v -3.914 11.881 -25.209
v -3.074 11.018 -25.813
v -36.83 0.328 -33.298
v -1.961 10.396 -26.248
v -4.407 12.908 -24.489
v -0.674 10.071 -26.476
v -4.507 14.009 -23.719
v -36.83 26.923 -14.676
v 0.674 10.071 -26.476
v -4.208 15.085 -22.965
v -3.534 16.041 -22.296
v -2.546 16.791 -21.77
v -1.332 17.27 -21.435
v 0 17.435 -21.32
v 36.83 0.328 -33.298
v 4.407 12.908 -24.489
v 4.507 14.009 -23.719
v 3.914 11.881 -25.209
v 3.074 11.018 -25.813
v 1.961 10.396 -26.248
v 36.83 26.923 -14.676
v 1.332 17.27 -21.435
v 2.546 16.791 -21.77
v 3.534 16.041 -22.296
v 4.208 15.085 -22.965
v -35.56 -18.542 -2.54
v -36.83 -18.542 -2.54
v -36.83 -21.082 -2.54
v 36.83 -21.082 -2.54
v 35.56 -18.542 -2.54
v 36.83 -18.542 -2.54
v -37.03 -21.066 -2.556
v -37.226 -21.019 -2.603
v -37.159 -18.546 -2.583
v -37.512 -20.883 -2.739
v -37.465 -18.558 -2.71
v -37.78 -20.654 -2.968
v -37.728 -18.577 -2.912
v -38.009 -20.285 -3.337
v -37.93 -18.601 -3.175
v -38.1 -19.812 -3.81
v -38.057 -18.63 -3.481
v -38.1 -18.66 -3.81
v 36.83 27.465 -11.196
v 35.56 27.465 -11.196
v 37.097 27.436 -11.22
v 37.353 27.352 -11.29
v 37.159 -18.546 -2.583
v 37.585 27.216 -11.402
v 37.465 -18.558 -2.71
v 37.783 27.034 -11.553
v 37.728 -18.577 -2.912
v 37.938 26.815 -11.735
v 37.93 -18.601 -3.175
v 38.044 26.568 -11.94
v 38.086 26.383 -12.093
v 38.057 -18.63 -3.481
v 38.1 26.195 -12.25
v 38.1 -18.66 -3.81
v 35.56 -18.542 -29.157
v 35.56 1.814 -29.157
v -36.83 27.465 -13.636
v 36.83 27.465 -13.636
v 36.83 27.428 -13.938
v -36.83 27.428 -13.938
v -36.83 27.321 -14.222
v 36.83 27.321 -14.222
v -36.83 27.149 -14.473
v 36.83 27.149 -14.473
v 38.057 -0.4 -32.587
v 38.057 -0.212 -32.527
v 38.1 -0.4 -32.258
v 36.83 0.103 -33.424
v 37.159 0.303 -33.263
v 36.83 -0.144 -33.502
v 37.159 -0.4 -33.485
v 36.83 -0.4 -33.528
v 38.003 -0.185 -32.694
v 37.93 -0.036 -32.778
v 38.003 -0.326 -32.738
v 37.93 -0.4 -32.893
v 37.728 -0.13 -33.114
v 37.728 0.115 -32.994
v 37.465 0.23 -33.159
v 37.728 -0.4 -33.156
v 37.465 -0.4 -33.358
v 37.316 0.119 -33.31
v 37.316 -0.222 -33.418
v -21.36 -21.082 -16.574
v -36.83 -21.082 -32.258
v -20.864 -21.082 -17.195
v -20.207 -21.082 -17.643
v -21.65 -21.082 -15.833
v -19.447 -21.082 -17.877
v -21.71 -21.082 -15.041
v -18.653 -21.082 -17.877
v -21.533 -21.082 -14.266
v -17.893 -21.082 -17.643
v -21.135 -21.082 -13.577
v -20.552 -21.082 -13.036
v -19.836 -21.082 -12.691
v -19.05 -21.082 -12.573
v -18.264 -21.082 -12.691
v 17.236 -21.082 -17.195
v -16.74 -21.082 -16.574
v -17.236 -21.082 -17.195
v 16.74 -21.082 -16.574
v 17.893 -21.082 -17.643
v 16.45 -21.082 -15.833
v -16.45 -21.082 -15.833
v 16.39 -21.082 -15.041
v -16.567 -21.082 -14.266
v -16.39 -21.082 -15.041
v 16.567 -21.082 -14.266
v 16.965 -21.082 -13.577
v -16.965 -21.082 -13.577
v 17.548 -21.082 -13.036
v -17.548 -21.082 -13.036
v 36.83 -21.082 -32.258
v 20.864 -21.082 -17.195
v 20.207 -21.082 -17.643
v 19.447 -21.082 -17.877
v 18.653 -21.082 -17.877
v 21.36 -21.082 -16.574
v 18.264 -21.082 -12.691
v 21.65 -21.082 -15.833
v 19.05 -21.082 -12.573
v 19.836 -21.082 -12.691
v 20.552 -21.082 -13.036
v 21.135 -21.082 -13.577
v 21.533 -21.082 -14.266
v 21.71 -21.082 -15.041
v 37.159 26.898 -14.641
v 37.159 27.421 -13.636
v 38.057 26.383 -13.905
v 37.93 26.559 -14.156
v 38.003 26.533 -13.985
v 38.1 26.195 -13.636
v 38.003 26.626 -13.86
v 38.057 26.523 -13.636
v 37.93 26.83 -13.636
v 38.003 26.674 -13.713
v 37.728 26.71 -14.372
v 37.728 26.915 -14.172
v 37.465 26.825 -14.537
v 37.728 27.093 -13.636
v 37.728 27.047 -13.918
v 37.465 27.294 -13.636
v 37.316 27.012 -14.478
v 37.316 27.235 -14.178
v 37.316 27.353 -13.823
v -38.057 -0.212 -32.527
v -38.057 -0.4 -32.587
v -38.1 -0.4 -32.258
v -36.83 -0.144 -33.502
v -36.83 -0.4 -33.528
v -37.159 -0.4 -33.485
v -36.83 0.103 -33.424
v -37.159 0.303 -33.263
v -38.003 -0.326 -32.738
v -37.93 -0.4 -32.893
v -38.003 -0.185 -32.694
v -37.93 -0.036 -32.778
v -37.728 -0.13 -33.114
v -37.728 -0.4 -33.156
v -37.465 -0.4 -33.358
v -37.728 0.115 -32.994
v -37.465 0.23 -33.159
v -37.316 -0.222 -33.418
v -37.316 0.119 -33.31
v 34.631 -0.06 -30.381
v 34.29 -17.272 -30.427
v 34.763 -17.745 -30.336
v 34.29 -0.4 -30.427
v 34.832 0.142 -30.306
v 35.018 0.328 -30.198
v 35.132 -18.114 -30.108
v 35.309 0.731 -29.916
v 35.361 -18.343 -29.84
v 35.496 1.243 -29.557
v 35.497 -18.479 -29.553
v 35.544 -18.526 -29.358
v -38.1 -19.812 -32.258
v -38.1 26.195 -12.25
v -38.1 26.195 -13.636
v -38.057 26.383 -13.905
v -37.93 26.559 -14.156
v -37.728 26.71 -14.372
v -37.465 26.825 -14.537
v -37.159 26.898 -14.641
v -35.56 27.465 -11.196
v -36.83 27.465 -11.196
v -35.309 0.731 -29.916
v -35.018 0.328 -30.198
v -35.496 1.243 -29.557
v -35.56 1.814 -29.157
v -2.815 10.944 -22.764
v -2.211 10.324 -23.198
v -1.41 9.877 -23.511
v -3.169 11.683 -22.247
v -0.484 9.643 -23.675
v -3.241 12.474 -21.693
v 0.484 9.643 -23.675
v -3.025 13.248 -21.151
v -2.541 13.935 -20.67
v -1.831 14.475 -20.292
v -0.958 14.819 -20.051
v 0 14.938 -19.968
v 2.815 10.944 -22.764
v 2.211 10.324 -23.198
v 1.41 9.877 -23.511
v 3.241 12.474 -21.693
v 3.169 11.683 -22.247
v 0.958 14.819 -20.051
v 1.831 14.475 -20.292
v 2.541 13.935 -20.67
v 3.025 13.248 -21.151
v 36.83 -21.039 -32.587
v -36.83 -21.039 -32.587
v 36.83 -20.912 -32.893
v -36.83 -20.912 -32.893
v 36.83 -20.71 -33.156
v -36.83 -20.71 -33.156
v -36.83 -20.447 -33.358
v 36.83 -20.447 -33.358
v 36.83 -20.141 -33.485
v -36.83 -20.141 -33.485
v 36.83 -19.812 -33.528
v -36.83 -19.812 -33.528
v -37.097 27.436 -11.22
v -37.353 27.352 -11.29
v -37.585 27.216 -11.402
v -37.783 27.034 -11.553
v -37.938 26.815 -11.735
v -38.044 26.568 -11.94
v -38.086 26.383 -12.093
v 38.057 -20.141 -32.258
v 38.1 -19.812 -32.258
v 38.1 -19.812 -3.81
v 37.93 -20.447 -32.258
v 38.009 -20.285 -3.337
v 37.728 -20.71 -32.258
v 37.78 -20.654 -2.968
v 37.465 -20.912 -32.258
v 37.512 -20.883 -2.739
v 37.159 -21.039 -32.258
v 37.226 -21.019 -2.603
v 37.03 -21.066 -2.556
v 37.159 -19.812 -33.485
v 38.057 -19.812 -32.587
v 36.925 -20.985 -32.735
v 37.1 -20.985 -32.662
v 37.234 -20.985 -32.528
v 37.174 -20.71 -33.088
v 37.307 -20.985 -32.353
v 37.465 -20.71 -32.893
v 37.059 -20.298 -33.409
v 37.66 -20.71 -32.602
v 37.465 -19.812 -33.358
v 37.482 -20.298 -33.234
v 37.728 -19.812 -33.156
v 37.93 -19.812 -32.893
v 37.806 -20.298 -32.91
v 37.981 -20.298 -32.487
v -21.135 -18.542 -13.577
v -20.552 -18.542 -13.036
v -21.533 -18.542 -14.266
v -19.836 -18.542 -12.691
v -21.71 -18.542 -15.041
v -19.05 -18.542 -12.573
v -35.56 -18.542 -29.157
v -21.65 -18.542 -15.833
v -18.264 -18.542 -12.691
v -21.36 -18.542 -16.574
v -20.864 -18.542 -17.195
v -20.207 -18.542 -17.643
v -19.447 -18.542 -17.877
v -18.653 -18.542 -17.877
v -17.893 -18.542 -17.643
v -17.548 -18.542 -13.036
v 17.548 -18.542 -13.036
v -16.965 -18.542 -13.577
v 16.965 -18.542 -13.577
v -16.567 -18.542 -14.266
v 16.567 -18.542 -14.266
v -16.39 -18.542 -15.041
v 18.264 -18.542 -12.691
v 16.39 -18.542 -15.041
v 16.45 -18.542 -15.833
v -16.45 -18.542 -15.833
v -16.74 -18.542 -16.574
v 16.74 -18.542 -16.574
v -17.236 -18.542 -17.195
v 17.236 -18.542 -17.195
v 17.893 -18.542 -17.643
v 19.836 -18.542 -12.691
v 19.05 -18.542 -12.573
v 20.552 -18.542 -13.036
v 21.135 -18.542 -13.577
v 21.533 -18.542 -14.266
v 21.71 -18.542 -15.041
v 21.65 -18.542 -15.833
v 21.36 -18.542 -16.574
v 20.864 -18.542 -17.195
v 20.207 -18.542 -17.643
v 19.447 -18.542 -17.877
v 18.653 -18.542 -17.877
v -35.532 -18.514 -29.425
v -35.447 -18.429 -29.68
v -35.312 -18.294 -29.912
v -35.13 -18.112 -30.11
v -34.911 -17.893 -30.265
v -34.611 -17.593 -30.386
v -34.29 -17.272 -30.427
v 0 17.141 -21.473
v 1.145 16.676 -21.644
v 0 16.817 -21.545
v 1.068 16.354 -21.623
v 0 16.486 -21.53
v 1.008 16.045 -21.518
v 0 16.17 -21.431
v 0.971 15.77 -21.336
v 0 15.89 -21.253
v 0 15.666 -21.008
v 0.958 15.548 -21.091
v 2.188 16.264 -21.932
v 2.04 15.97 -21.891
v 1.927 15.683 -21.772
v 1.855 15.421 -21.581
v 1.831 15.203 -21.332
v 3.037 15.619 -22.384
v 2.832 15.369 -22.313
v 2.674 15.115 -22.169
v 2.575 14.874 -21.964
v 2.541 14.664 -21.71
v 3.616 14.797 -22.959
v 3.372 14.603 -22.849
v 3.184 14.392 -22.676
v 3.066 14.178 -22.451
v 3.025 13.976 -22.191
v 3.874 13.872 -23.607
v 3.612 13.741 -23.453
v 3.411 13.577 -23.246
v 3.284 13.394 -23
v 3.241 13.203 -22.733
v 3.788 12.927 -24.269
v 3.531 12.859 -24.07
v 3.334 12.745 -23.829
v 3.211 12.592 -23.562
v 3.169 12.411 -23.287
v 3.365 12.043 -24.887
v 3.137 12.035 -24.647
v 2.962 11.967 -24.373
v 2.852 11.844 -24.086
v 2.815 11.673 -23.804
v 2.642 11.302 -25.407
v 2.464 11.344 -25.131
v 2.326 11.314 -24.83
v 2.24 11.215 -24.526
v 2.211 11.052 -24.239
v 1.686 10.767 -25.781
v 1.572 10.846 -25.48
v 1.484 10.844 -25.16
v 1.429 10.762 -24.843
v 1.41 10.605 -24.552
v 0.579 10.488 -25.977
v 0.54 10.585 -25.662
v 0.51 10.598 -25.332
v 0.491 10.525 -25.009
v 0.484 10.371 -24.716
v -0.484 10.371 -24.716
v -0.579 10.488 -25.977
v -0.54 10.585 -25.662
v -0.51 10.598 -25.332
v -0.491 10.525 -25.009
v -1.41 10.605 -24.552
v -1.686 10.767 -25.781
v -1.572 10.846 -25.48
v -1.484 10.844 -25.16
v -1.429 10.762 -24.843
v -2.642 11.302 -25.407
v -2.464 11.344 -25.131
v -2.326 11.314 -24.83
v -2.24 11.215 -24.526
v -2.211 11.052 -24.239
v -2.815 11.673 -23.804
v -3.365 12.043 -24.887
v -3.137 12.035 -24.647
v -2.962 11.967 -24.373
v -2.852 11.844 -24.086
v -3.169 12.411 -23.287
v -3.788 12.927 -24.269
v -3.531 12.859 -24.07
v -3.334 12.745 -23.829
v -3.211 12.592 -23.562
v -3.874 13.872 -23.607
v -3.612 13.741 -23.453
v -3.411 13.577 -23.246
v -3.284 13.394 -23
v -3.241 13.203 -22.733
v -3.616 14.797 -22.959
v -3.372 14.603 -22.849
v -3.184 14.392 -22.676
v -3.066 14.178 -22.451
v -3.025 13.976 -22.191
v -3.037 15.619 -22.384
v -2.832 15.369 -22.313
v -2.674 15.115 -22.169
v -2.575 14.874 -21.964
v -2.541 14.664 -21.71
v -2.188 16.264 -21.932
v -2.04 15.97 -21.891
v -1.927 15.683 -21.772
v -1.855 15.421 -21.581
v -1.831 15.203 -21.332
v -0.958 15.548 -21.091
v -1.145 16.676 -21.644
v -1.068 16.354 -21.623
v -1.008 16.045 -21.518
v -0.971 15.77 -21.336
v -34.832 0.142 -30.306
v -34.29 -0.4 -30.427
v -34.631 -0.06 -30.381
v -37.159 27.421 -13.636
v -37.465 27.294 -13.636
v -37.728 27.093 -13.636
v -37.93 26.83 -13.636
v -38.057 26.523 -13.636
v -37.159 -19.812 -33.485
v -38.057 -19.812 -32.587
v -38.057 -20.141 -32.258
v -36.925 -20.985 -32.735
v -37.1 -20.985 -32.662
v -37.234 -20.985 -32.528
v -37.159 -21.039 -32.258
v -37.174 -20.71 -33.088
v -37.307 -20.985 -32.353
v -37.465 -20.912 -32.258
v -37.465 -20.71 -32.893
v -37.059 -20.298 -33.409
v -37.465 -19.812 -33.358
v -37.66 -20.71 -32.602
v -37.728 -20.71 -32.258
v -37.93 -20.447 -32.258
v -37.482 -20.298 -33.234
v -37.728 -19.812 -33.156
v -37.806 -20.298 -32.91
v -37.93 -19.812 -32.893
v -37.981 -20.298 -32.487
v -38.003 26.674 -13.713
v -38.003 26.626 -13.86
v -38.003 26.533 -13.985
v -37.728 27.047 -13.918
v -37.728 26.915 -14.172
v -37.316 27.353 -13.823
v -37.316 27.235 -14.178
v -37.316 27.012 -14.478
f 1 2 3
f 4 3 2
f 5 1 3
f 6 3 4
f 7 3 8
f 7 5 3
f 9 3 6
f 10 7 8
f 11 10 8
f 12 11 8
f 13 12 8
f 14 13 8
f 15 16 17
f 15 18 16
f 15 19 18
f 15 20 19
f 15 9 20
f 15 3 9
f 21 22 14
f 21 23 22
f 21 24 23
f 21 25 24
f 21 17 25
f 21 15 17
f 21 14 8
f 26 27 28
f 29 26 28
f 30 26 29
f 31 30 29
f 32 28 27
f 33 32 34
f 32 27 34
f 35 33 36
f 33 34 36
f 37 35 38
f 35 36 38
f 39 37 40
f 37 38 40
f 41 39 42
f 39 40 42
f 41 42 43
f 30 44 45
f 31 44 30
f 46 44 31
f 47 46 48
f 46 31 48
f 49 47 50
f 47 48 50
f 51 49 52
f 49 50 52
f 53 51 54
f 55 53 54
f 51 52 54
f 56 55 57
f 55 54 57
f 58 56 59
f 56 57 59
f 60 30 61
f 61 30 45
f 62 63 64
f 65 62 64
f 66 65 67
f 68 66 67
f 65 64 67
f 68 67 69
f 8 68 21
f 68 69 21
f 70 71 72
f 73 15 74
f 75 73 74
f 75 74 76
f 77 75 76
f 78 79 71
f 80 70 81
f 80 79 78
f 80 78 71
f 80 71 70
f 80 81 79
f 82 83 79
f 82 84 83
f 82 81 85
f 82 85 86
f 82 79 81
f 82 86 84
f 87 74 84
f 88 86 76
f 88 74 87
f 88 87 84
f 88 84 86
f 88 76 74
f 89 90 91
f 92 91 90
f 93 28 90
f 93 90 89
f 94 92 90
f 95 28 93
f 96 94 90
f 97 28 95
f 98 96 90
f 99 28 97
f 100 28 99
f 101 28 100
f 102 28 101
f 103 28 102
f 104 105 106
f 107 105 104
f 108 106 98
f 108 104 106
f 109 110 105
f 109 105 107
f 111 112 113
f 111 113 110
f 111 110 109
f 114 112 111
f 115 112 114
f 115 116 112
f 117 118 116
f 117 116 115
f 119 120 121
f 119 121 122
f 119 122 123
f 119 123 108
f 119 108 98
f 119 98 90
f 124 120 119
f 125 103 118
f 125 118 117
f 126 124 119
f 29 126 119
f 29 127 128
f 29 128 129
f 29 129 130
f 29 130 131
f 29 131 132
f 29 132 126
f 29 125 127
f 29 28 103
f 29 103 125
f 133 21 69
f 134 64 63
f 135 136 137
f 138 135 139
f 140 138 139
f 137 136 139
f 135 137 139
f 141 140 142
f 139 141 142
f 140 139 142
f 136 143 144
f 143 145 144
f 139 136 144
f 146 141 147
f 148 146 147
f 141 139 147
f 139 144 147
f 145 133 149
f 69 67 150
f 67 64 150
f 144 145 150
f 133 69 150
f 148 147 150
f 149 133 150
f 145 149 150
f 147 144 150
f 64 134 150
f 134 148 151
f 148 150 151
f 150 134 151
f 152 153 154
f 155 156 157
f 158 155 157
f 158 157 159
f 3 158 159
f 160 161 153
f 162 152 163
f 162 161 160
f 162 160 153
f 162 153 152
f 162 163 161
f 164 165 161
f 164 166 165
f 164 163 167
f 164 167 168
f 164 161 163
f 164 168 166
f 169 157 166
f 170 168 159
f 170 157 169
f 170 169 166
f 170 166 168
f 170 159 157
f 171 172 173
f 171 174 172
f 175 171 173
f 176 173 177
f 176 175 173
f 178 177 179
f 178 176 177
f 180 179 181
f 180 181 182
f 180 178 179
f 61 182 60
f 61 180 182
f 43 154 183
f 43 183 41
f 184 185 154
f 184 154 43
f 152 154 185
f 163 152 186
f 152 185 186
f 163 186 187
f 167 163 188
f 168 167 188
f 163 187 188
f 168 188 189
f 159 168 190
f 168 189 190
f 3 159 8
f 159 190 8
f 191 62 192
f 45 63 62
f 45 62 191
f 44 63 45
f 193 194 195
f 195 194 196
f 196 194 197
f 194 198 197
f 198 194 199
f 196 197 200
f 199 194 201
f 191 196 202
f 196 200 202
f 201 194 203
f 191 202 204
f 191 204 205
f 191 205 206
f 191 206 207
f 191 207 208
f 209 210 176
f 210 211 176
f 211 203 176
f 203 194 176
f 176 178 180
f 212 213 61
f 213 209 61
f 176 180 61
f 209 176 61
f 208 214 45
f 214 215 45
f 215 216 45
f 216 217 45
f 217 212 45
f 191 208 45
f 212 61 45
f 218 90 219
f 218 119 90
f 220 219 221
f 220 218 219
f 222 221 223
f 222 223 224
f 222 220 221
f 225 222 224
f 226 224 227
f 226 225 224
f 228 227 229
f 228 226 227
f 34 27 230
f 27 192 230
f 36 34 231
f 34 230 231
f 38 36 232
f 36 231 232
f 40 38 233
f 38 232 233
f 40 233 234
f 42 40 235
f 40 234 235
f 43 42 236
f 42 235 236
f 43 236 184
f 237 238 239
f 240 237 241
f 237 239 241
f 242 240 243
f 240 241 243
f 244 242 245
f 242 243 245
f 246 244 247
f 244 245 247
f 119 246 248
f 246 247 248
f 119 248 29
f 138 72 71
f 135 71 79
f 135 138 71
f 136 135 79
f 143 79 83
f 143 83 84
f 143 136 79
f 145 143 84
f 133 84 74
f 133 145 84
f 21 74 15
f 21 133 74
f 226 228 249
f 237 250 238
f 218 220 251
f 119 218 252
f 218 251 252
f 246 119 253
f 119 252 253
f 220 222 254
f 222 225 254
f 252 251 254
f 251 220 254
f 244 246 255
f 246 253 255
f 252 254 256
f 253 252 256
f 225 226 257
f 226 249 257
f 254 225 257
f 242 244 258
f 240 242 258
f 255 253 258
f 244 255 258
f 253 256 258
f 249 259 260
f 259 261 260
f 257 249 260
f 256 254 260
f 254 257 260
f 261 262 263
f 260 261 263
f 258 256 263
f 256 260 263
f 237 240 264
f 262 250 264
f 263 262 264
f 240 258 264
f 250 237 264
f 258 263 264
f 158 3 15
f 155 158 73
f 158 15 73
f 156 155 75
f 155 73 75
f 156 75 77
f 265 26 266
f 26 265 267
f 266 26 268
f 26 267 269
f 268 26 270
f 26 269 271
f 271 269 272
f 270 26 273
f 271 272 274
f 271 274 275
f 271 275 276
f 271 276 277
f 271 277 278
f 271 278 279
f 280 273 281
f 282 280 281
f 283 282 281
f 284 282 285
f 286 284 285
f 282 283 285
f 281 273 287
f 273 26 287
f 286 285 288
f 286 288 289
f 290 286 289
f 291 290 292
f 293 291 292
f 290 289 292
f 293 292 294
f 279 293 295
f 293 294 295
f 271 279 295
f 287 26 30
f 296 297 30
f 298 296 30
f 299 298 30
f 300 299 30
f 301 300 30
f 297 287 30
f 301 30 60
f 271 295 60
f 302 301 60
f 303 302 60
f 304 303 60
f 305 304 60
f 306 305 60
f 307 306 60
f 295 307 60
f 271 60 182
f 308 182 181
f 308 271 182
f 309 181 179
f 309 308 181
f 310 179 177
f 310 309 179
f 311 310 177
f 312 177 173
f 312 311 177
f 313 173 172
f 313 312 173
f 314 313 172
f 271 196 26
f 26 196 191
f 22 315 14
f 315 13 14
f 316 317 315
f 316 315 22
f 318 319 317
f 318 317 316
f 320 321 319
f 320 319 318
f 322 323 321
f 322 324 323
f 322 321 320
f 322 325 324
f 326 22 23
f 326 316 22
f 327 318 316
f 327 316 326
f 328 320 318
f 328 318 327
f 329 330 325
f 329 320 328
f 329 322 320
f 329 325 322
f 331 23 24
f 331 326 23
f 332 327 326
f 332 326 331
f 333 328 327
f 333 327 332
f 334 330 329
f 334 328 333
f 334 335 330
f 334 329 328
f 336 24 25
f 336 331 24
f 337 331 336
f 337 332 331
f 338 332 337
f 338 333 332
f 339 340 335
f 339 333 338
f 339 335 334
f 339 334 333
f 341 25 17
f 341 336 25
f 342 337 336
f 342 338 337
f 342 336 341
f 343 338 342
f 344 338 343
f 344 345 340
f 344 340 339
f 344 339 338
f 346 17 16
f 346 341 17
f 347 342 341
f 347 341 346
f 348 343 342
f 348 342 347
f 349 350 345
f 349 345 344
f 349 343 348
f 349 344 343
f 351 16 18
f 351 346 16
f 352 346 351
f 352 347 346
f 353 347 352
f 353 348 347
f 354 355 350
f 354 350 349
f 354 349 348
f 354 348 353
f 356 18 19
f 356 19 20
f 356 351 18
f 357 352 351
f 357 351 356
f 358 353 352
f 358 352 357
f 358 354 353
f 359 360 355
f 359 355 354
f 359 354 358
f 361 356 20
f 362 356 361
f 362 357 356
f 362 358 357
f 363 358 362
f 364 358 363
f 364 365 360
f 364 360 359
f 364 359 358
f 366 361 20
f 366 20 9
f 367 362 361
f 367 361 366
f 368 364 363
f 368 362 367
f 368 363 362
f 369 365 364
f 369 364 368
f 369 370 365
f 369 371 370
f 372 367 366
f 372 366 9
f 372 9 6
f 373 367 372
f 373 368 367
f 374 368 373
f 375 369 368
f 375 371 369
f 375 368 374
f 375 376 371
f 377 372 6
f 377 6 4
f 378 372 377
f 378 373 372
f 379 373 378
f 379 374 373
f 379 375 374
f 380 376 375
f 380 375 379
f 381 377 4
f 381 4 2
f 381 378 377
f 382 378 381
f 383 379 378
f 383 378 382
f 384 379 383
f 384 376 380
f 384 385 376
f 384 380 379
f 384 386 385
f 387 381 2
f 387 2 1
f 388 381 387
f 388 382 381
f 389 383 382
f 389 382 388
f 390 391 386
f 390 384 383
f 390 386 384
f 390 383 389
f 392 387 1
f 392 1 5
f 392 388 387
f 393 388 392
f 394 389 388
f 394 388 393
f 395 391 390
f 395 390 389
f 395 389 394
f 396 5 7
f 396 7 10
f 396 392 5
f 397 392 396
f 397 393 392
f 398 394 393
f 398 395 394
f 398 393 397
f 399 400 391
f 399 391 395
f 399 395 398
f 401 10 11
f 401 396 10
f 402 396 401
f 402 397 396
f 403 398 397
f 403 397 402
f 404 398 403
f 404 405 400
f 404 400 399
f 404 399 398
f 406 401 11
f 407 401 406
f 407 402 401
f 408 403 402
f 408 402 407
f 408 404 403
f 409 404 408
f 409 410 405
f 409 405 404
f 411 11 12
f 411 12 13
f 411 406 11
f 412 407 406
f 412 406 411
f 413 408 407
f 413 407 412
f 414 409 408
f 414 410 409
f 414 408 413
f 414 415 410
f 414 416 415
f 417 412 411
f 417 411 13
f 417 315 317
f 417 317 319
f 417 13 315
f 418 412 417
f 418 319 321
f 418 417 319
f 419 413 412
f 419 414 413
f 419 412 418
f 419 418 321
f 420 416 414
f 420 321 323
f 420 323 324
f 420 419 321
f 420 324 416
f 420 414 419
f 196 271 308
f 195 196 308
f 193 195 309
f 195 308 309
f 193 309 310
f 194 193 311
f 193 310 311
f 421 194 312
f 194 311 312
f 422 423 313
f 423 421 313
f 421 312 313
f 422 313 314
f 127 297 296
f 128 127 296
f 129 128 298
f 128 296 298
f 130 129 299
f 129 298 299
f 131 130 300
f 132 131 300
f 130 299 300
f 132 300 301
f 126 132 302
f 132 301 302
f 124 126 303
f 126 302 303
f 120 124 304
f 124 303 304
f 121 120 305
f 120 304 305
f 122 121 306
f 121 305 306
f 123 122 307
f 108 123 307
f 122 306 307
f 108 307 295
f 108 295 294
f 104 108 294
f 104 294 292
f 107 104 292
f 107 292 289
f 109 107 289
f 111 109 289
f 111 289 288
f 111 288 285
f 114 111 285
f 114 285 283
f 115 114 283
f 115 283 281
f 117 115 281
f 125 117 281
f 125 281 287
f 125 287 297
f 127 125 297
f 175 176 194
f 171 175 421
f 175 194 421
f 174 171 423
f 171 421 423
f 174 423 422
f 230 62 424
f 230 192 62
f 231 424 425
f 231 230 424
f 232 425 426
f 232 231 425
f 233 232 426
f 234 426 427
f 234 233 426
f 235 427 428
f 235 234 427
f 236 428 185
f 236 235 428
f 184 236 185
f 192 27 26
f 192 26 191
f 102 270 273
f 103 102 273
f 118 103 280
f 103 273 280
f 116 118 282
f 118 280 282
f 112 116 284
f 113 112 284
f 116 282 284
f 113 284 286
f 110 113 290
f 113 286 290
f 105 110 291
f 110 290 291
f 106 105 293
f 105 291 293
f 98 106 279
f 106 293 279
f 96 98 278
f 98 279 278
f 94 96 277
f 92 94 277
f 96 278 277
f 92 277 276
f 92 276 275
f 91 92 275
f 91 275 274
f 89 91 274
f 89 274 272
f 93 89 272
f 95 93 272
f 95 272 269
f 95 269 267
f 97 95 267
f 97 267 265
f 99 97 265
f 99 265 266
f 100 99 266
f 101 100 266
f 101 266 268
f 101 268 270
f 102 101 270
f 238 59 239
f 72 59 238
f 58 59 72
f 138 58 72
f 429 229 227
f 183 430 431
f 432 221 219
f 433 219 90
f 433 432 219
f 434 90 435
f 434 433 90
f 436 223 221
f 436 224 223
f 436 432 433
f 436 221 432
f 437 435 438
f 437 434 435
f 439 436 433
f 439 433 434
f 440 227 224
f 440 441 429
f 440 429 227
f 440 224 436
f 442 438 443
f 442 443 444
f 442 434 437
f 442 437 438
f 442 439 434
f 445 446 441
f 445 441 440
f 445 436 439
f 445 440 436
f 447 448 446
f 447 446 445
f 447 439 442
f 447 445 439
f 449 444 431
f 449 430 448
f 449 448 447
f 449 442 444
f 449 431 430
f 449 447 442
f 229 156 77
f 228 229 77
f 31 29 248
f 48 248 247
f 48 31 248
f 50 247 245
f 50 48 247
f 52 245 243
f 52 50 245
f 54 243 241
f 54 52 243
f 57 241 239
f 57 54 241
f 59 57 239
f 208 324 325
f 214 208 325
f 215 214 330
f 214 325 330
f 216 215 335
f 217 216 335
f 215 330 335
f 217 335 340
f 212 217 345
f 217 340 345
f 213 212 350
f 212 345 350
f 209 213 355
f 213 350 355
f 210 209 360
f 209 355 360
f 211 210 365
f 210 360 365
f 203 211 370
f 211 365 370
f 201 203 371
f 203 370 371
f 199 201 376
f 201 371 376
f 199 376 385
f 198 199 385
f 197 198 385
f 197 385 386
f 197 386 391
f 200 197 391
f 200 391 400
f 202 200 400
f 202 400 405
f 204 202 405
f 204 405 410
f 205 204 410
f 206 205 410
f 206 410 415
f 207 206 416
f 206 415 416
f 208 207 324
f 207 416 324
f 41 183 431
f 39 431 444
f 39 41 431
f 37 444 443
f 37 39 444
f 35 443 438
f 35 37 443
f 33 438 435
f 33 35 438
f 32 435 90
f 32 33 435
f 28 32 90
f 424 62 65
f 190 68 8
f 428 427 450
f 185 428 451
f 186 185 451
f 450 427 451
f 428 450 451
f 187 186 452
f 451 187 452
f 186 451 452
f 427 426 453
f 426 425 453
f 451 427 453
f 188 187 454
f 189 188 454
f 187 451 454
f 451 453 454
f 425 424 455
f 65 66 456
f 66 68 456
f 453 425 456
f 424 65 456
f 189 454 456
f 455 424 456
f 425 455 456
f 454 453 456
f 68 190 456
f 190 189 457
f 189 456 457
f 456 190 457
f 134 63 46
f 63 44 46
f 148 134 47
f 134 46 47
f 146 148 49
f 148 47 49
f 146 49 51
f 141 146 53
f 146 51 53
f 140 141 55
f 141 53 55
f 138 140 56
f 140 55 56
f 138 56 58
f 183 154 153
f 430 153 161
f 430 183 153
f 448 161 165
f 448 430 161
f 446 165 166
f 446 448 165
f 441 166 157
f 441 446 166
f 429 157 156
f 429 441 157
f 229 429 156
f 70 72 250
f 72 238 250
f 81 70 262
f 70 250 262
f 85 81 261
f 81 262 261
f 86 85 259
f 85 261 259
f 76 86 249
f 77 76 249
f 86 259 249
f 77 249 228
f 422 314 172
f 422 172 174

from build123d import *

# Parameters (mm, degrees)
BOSS_EXTRUDE1_DEPTH  = 38.1
SKETCH5_W            = 76.2
SKETCH5_H            = 33.528
BOSS_EXTRUDE2_DEPTH  = 21.082
CUT_EXTRUDE2_DEPTH   = 88.66337421
SKETCH7_R            = 2.667
CUT_EXTRUDE3_DEPTH   = 69.500639142
SKETCH12_R           = 3.25
CUT_EXTRUDE7_DEPTH   = 2.54
SKETCH13_W           = 79.969594391
SKETCH13_H           = 52.20621733
CUT_EXTRUDE8_DEPTH   = 2.54
BOSS_EXTRUDE4_DEPTH  = 2.54
BOSS_EXTRUDE10_DEPTH = 2.54
FILLET8_R            = 1.27


with BuildPart() as part:
    # Sketch1 → Boss-Extrude1 (new, symmetric)
    with BuildSketch(Plane(origin=(0, 0, 0), x_dir=(0, 0, -1), z_dir=(1, 0, 0))):
        Polygon((0, 0), (33.528, 0), (14.297129242, 27.464529741), (0, 27.464529741), align=None)
    extrude(amount=BOSS_EXTRUDE1_DEPTH, both=True)

    # Sketch5 → Boss-Extrude2 (add)
    with BuildSketch(Plane.XZ):
        with Locations((0, -16.764)):
            Rectangle(SKETCH5_W, SKETCH5_H)
    extrude(amount=BOSS_EXTRUDE2_DEPTH)

    # Sketch6 → Cut-Extrude2 (cut, through all)
    with BuildSketch(Plane(origin=(38.1, 0, 0), x_dir=(0, 0, -1), z_dir=(1, 0, 0))):
        Polygon((2.54, 39.827095572), (2.54, -18.542), (30.427232545, -18.542), (30.427232545, 0), align=None)
    extrude(amount=-CUT_EXTRUDE2_DEPTH, mode=Mode.SUBTRACT)

    # Sketch7 → Cut-Extrude3 (cut, through all)
    with BuildSketch(Plane(origin=(0, -18.542, 0), x_dir=(1, 0, 0), z_dir=(0, 1, 0))):
        with Locations(Location((19.05, 15.24, 0), (0, 0, 270))):
            Circle(SKETCH7_R)
        with Locations(Location((-19.05, 15.24, 0), (0, 0, 270))):
            Circle(SKETCH7_R)
    extrude(amount=-CUT_EXTRUDE3_DEPTH, mode=Mode.SUBTRACT)

    # Sketch12 → Cut-Extrude7 (cut)
    with BuildSketch(Plane(origin=(0, 15.753007095, -22.497625683), x_dir=(-1, 0, 0), z_dir=(0, 0.5735764363510444, -0.8191520442889929))):
        with Locations(Location((0, -2.466870758, 0), (0, 0, 90))):
            Circle(SKETCH12_R)
    extrude(amount=-CUT_EXTRUDE7_DEPTH, mode=Mode.SUBTRACT)

    # Sketch13 → Cut-Extrude8 (cut)
    with BuildSketch(Plane.XY):
        with Locations((-0.230592833, 3.838694169)):
            Rectangle(SKETCH13_W, SKETCH13_H)
    extrude(amount=-CUT_EXTRUDE8_DEPTH, mode=Mode.SUBTRACT)

    # Sketch16 → Boss-Extrude4 (add)
    with BuildSketch(Plane(origin=(38.1, 0, 0), x_dir=(0, 0, -1), z_dir=(1, 0, 0))):
        Polygon((2.54, -18.542), (30.427232545, -18.542), (30.427232545, 0), (11.196361787, 27.464529741), align=None)
    extrude(amount=-BOSS_EXTRUDE4_DEPTH)

    # Sketch17 → Boss-Extrude10 (add)
    with BuildSketch(Plane.ZY.offset(38.1)):
        Polygon((-11.196361787, 27.464529741), (-30.427232545, 0), (-30.427232545, -18.542), (-2.54, -18.542), align=None)
    extrude(amount=-BOSS_EXTRUDE10_DEPTH)

    # Fillet8
    fillet8_edges = [part.edges().sort_by_distance(p)[0] for p in [
        (38.1, 13.73226487, -23.912564621),
        (38.1, 27.464529741, -12.746745514),
        (-38.1, -10.541, -33.528),
        (38.1, -10.541, -33.528),
        (0, -21.082, -33.528),
        (38.1, -21.082, -18.034),
        (-38.1, 27.464529741, -12.746745514),
        (-38.1, 13.73226487, -23.912564621),
        (0, 11.070020727, -25.776688039),
        (-38.1, -21.082, -18.034),
        (-38.1, -19.812, -2.54),
        (38.1, -19.812, -2.54),
        (0, 27.464529741, -14.297129242),
        (0, 0, -33.528),
        (35.56, -9.271, -30.427232545),
        (38.1, 4.46126487, -6.868180893),
        (0, -18.542, -30.427232545),
        (0, 0, -30.427232545),
        (-35.56, -9.271, -30.427232545),
        (-38.1, 4.46126487, -6.868180893),
    ]]
    fillet(fillet8_edges, radius=FILLET8_R)


solid = part.part
